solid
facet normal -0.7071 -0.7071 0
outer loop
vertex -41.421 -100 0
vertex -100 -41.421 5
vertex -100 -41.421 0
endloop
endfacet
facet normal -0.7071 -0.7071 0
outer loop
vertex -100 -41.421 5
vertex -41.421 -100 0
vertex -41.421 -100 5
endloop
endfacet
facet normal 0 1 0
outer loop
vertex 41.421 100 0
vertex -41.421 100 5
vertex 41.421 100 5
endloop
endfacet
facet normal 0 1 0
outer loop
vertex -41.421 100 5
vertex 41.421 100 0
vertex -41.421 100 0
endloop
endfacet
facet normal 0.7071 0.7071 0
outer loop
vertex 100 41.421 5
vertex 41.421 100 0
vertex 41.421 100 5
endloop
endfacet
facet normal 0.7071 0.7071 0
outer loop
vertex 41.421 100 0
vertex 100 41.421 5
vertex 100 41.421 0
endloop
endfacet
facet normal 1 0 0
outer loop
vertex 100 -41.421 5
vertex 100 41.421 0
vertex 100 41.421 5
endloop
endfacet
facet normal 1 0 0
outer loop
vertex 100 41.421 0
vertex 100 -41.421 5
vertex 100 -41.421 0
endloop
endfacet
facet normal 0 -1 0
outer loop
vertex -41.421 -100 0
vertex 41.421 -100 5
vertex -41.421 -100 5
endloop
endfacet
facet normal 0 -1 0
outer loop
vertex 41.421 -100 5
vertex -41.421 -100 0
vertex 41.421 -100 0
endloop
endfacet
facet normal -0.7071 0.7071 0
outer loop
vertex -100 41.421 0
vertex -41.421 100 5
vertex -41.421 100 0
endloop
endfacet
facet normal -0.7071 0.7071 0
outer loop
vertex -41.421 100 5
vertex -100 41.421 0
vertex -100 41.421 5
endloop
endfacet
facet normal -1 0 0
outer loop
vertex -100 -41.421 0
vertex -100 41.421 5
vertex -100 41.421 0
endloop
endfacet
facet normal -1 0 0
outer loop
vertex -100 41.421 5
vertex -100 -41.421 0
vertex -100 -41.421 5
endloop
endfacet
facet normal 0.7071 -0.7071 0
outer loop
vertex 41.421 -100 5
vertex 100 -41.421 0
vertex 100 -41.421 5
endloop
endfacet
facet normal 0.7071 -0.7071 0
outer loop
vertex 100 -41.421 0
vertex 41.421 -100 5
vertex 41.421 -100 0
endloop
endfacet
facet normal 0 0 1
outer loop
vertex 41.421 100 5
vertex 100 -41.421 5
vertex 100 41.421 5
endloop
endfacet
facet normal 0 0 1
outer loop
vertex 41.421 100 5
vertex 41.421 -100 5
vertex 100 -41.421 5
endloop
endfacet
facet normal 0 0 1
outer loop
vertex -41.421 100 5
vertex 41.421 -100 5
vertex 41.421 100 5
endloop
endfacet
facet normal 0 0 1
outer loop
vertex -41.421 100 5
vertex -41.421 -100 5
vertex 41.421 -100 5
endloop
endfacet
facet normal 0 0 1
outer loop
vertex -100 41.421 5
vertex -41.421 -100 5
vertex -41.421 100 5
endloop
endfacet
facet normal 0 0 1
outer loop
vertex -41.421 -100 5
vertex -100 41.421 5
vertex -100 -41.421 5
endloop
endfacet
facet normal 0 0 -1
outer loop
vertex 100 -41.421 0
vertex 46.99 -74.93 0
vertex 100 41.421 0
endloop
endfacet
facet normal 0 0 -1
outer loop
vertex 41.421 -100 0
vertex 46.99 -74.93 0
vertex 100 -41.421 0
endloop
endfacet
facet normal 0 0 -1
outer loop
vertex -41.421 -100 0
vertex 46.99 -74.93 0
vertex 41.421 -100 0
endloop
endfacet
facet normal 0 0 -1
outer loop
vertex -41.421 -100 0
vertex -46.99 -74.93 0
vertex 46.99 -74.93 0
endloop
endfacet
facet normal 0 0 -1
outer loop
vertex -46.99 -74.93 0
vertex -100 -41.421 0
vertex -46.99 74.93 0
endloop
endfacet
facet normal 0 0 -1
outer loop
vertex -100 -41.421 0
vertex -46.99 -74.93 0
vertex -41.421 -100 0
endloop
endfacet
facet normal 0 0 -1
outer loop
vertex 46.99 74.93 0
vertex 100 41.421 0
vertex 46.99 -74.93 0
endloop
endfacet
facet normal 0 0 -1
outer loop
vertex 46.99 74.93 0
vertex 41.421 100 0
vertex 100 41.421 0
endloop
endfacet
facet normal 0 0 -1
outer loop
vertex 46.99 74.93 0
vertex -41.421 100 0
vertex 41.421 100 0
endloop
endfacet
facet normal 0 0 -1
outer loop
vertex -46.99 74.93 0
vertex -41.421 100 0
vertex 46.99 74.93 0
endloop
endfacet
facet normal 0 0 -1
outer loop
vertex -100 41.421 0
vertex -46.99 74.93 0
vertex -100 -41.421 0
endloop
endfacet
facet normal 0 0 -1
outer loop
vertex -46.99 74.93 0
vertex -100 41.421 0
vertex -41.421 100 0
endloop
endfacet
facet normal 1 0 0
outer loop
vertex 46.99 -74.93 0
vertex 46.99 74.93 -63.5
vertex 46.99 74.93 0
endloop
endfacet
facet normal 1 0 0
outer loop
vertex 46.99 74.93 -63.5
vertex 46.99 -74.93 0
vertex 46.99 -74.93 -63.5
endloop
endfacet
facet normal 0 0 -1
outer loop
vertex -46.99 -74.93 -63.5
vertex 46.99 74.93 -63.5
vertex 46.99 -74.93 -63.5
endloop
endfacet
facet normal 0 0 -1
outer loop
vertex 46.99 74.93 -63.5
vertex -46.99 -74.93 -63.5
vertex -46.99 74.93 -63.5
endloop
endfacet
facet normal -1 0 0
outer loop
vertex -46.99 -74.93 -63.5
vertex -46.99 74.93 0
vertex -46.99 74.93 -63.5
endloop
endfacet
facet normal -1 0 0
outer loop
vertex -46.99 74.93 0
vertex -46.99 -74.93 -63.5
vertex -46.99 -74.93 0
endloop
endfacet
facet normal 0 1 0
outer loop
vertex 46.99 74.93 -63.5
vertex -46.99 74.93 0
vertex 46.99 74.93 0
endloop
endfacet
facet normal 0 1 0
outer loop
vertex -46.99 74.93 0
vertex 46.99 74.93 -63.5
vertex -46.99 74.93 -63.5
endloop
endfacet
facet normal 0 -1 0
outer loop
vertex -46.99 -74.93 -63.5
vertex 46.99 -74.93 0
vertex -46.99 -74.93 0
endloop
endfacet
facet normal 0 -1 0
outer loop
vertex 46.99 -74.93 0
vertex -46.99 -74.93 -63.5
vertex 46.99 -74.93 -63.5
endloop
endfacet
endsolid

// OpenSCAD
axle_rad = 150; //radius of the axle mounting points - how far the motors are from center.
plate_rad = axle_rad+20;

in = 25.4;

wall = 5;

wheel_rad = 80/2;
wheel_thick = 60;
wheel_lift = 10+wall;  //distance center of axle is above 0.

motor_rad = 37/2;
motor_len = 33+26.5;

//sphere bottom, for sizeing
*%translate([00,0,0]) intersection(){
    translate([0,0,152]) difference(){
        sphere(r=508/2);
        sphere(r=508/2-10, $fn=180);
    }
    translate([0,0,-300]) cube([600,600,600], center=true);
}


hamster();

module hamster(){
    difference(){
        union(){
            //main support plate
            rotate([0,0,22.5]) cylinder(r=100/cos(180/8), h=wall, $fn=8);
            
            //draw the wheels in
            %for(i=[0:90:359]) rotate([0,0,i]) translate([axle_rad,0,wheel_lift]) rotate([90,0,0]){
                //wheel
                cylinder(r=wheel_rad, h=wheel_thick, center=true);
                
                //motor: side mount
                //translate([0,0,wheel_thick/2]) cylinder(r=motor_rad, h=motor_len);
                
                //motor: parallel mount
                //hide the motor underneath :-)
                translate([-wheel_rad-motor_rad,-motor_rad-wheel_lift,-motor_len/2]) cylinder(r=motor_rad, h=motor_len);
            }
            
            //batteries?
            #translate([0,0,0]) battery();
        }
    }
}

module battery(){
    translate([0,0,-1.25*in]) cube([3.7*in, 5.9*in, 2.5*in], center=true);//http://www.amazon.com/ExpertPower-EXP1290-Volt-Rechargeable-battery/dp/B00A82A3QG/ref=sr_1_9?ie=UTF8&qid=1462559752&sr=8-9&keywords=12+battery
}
